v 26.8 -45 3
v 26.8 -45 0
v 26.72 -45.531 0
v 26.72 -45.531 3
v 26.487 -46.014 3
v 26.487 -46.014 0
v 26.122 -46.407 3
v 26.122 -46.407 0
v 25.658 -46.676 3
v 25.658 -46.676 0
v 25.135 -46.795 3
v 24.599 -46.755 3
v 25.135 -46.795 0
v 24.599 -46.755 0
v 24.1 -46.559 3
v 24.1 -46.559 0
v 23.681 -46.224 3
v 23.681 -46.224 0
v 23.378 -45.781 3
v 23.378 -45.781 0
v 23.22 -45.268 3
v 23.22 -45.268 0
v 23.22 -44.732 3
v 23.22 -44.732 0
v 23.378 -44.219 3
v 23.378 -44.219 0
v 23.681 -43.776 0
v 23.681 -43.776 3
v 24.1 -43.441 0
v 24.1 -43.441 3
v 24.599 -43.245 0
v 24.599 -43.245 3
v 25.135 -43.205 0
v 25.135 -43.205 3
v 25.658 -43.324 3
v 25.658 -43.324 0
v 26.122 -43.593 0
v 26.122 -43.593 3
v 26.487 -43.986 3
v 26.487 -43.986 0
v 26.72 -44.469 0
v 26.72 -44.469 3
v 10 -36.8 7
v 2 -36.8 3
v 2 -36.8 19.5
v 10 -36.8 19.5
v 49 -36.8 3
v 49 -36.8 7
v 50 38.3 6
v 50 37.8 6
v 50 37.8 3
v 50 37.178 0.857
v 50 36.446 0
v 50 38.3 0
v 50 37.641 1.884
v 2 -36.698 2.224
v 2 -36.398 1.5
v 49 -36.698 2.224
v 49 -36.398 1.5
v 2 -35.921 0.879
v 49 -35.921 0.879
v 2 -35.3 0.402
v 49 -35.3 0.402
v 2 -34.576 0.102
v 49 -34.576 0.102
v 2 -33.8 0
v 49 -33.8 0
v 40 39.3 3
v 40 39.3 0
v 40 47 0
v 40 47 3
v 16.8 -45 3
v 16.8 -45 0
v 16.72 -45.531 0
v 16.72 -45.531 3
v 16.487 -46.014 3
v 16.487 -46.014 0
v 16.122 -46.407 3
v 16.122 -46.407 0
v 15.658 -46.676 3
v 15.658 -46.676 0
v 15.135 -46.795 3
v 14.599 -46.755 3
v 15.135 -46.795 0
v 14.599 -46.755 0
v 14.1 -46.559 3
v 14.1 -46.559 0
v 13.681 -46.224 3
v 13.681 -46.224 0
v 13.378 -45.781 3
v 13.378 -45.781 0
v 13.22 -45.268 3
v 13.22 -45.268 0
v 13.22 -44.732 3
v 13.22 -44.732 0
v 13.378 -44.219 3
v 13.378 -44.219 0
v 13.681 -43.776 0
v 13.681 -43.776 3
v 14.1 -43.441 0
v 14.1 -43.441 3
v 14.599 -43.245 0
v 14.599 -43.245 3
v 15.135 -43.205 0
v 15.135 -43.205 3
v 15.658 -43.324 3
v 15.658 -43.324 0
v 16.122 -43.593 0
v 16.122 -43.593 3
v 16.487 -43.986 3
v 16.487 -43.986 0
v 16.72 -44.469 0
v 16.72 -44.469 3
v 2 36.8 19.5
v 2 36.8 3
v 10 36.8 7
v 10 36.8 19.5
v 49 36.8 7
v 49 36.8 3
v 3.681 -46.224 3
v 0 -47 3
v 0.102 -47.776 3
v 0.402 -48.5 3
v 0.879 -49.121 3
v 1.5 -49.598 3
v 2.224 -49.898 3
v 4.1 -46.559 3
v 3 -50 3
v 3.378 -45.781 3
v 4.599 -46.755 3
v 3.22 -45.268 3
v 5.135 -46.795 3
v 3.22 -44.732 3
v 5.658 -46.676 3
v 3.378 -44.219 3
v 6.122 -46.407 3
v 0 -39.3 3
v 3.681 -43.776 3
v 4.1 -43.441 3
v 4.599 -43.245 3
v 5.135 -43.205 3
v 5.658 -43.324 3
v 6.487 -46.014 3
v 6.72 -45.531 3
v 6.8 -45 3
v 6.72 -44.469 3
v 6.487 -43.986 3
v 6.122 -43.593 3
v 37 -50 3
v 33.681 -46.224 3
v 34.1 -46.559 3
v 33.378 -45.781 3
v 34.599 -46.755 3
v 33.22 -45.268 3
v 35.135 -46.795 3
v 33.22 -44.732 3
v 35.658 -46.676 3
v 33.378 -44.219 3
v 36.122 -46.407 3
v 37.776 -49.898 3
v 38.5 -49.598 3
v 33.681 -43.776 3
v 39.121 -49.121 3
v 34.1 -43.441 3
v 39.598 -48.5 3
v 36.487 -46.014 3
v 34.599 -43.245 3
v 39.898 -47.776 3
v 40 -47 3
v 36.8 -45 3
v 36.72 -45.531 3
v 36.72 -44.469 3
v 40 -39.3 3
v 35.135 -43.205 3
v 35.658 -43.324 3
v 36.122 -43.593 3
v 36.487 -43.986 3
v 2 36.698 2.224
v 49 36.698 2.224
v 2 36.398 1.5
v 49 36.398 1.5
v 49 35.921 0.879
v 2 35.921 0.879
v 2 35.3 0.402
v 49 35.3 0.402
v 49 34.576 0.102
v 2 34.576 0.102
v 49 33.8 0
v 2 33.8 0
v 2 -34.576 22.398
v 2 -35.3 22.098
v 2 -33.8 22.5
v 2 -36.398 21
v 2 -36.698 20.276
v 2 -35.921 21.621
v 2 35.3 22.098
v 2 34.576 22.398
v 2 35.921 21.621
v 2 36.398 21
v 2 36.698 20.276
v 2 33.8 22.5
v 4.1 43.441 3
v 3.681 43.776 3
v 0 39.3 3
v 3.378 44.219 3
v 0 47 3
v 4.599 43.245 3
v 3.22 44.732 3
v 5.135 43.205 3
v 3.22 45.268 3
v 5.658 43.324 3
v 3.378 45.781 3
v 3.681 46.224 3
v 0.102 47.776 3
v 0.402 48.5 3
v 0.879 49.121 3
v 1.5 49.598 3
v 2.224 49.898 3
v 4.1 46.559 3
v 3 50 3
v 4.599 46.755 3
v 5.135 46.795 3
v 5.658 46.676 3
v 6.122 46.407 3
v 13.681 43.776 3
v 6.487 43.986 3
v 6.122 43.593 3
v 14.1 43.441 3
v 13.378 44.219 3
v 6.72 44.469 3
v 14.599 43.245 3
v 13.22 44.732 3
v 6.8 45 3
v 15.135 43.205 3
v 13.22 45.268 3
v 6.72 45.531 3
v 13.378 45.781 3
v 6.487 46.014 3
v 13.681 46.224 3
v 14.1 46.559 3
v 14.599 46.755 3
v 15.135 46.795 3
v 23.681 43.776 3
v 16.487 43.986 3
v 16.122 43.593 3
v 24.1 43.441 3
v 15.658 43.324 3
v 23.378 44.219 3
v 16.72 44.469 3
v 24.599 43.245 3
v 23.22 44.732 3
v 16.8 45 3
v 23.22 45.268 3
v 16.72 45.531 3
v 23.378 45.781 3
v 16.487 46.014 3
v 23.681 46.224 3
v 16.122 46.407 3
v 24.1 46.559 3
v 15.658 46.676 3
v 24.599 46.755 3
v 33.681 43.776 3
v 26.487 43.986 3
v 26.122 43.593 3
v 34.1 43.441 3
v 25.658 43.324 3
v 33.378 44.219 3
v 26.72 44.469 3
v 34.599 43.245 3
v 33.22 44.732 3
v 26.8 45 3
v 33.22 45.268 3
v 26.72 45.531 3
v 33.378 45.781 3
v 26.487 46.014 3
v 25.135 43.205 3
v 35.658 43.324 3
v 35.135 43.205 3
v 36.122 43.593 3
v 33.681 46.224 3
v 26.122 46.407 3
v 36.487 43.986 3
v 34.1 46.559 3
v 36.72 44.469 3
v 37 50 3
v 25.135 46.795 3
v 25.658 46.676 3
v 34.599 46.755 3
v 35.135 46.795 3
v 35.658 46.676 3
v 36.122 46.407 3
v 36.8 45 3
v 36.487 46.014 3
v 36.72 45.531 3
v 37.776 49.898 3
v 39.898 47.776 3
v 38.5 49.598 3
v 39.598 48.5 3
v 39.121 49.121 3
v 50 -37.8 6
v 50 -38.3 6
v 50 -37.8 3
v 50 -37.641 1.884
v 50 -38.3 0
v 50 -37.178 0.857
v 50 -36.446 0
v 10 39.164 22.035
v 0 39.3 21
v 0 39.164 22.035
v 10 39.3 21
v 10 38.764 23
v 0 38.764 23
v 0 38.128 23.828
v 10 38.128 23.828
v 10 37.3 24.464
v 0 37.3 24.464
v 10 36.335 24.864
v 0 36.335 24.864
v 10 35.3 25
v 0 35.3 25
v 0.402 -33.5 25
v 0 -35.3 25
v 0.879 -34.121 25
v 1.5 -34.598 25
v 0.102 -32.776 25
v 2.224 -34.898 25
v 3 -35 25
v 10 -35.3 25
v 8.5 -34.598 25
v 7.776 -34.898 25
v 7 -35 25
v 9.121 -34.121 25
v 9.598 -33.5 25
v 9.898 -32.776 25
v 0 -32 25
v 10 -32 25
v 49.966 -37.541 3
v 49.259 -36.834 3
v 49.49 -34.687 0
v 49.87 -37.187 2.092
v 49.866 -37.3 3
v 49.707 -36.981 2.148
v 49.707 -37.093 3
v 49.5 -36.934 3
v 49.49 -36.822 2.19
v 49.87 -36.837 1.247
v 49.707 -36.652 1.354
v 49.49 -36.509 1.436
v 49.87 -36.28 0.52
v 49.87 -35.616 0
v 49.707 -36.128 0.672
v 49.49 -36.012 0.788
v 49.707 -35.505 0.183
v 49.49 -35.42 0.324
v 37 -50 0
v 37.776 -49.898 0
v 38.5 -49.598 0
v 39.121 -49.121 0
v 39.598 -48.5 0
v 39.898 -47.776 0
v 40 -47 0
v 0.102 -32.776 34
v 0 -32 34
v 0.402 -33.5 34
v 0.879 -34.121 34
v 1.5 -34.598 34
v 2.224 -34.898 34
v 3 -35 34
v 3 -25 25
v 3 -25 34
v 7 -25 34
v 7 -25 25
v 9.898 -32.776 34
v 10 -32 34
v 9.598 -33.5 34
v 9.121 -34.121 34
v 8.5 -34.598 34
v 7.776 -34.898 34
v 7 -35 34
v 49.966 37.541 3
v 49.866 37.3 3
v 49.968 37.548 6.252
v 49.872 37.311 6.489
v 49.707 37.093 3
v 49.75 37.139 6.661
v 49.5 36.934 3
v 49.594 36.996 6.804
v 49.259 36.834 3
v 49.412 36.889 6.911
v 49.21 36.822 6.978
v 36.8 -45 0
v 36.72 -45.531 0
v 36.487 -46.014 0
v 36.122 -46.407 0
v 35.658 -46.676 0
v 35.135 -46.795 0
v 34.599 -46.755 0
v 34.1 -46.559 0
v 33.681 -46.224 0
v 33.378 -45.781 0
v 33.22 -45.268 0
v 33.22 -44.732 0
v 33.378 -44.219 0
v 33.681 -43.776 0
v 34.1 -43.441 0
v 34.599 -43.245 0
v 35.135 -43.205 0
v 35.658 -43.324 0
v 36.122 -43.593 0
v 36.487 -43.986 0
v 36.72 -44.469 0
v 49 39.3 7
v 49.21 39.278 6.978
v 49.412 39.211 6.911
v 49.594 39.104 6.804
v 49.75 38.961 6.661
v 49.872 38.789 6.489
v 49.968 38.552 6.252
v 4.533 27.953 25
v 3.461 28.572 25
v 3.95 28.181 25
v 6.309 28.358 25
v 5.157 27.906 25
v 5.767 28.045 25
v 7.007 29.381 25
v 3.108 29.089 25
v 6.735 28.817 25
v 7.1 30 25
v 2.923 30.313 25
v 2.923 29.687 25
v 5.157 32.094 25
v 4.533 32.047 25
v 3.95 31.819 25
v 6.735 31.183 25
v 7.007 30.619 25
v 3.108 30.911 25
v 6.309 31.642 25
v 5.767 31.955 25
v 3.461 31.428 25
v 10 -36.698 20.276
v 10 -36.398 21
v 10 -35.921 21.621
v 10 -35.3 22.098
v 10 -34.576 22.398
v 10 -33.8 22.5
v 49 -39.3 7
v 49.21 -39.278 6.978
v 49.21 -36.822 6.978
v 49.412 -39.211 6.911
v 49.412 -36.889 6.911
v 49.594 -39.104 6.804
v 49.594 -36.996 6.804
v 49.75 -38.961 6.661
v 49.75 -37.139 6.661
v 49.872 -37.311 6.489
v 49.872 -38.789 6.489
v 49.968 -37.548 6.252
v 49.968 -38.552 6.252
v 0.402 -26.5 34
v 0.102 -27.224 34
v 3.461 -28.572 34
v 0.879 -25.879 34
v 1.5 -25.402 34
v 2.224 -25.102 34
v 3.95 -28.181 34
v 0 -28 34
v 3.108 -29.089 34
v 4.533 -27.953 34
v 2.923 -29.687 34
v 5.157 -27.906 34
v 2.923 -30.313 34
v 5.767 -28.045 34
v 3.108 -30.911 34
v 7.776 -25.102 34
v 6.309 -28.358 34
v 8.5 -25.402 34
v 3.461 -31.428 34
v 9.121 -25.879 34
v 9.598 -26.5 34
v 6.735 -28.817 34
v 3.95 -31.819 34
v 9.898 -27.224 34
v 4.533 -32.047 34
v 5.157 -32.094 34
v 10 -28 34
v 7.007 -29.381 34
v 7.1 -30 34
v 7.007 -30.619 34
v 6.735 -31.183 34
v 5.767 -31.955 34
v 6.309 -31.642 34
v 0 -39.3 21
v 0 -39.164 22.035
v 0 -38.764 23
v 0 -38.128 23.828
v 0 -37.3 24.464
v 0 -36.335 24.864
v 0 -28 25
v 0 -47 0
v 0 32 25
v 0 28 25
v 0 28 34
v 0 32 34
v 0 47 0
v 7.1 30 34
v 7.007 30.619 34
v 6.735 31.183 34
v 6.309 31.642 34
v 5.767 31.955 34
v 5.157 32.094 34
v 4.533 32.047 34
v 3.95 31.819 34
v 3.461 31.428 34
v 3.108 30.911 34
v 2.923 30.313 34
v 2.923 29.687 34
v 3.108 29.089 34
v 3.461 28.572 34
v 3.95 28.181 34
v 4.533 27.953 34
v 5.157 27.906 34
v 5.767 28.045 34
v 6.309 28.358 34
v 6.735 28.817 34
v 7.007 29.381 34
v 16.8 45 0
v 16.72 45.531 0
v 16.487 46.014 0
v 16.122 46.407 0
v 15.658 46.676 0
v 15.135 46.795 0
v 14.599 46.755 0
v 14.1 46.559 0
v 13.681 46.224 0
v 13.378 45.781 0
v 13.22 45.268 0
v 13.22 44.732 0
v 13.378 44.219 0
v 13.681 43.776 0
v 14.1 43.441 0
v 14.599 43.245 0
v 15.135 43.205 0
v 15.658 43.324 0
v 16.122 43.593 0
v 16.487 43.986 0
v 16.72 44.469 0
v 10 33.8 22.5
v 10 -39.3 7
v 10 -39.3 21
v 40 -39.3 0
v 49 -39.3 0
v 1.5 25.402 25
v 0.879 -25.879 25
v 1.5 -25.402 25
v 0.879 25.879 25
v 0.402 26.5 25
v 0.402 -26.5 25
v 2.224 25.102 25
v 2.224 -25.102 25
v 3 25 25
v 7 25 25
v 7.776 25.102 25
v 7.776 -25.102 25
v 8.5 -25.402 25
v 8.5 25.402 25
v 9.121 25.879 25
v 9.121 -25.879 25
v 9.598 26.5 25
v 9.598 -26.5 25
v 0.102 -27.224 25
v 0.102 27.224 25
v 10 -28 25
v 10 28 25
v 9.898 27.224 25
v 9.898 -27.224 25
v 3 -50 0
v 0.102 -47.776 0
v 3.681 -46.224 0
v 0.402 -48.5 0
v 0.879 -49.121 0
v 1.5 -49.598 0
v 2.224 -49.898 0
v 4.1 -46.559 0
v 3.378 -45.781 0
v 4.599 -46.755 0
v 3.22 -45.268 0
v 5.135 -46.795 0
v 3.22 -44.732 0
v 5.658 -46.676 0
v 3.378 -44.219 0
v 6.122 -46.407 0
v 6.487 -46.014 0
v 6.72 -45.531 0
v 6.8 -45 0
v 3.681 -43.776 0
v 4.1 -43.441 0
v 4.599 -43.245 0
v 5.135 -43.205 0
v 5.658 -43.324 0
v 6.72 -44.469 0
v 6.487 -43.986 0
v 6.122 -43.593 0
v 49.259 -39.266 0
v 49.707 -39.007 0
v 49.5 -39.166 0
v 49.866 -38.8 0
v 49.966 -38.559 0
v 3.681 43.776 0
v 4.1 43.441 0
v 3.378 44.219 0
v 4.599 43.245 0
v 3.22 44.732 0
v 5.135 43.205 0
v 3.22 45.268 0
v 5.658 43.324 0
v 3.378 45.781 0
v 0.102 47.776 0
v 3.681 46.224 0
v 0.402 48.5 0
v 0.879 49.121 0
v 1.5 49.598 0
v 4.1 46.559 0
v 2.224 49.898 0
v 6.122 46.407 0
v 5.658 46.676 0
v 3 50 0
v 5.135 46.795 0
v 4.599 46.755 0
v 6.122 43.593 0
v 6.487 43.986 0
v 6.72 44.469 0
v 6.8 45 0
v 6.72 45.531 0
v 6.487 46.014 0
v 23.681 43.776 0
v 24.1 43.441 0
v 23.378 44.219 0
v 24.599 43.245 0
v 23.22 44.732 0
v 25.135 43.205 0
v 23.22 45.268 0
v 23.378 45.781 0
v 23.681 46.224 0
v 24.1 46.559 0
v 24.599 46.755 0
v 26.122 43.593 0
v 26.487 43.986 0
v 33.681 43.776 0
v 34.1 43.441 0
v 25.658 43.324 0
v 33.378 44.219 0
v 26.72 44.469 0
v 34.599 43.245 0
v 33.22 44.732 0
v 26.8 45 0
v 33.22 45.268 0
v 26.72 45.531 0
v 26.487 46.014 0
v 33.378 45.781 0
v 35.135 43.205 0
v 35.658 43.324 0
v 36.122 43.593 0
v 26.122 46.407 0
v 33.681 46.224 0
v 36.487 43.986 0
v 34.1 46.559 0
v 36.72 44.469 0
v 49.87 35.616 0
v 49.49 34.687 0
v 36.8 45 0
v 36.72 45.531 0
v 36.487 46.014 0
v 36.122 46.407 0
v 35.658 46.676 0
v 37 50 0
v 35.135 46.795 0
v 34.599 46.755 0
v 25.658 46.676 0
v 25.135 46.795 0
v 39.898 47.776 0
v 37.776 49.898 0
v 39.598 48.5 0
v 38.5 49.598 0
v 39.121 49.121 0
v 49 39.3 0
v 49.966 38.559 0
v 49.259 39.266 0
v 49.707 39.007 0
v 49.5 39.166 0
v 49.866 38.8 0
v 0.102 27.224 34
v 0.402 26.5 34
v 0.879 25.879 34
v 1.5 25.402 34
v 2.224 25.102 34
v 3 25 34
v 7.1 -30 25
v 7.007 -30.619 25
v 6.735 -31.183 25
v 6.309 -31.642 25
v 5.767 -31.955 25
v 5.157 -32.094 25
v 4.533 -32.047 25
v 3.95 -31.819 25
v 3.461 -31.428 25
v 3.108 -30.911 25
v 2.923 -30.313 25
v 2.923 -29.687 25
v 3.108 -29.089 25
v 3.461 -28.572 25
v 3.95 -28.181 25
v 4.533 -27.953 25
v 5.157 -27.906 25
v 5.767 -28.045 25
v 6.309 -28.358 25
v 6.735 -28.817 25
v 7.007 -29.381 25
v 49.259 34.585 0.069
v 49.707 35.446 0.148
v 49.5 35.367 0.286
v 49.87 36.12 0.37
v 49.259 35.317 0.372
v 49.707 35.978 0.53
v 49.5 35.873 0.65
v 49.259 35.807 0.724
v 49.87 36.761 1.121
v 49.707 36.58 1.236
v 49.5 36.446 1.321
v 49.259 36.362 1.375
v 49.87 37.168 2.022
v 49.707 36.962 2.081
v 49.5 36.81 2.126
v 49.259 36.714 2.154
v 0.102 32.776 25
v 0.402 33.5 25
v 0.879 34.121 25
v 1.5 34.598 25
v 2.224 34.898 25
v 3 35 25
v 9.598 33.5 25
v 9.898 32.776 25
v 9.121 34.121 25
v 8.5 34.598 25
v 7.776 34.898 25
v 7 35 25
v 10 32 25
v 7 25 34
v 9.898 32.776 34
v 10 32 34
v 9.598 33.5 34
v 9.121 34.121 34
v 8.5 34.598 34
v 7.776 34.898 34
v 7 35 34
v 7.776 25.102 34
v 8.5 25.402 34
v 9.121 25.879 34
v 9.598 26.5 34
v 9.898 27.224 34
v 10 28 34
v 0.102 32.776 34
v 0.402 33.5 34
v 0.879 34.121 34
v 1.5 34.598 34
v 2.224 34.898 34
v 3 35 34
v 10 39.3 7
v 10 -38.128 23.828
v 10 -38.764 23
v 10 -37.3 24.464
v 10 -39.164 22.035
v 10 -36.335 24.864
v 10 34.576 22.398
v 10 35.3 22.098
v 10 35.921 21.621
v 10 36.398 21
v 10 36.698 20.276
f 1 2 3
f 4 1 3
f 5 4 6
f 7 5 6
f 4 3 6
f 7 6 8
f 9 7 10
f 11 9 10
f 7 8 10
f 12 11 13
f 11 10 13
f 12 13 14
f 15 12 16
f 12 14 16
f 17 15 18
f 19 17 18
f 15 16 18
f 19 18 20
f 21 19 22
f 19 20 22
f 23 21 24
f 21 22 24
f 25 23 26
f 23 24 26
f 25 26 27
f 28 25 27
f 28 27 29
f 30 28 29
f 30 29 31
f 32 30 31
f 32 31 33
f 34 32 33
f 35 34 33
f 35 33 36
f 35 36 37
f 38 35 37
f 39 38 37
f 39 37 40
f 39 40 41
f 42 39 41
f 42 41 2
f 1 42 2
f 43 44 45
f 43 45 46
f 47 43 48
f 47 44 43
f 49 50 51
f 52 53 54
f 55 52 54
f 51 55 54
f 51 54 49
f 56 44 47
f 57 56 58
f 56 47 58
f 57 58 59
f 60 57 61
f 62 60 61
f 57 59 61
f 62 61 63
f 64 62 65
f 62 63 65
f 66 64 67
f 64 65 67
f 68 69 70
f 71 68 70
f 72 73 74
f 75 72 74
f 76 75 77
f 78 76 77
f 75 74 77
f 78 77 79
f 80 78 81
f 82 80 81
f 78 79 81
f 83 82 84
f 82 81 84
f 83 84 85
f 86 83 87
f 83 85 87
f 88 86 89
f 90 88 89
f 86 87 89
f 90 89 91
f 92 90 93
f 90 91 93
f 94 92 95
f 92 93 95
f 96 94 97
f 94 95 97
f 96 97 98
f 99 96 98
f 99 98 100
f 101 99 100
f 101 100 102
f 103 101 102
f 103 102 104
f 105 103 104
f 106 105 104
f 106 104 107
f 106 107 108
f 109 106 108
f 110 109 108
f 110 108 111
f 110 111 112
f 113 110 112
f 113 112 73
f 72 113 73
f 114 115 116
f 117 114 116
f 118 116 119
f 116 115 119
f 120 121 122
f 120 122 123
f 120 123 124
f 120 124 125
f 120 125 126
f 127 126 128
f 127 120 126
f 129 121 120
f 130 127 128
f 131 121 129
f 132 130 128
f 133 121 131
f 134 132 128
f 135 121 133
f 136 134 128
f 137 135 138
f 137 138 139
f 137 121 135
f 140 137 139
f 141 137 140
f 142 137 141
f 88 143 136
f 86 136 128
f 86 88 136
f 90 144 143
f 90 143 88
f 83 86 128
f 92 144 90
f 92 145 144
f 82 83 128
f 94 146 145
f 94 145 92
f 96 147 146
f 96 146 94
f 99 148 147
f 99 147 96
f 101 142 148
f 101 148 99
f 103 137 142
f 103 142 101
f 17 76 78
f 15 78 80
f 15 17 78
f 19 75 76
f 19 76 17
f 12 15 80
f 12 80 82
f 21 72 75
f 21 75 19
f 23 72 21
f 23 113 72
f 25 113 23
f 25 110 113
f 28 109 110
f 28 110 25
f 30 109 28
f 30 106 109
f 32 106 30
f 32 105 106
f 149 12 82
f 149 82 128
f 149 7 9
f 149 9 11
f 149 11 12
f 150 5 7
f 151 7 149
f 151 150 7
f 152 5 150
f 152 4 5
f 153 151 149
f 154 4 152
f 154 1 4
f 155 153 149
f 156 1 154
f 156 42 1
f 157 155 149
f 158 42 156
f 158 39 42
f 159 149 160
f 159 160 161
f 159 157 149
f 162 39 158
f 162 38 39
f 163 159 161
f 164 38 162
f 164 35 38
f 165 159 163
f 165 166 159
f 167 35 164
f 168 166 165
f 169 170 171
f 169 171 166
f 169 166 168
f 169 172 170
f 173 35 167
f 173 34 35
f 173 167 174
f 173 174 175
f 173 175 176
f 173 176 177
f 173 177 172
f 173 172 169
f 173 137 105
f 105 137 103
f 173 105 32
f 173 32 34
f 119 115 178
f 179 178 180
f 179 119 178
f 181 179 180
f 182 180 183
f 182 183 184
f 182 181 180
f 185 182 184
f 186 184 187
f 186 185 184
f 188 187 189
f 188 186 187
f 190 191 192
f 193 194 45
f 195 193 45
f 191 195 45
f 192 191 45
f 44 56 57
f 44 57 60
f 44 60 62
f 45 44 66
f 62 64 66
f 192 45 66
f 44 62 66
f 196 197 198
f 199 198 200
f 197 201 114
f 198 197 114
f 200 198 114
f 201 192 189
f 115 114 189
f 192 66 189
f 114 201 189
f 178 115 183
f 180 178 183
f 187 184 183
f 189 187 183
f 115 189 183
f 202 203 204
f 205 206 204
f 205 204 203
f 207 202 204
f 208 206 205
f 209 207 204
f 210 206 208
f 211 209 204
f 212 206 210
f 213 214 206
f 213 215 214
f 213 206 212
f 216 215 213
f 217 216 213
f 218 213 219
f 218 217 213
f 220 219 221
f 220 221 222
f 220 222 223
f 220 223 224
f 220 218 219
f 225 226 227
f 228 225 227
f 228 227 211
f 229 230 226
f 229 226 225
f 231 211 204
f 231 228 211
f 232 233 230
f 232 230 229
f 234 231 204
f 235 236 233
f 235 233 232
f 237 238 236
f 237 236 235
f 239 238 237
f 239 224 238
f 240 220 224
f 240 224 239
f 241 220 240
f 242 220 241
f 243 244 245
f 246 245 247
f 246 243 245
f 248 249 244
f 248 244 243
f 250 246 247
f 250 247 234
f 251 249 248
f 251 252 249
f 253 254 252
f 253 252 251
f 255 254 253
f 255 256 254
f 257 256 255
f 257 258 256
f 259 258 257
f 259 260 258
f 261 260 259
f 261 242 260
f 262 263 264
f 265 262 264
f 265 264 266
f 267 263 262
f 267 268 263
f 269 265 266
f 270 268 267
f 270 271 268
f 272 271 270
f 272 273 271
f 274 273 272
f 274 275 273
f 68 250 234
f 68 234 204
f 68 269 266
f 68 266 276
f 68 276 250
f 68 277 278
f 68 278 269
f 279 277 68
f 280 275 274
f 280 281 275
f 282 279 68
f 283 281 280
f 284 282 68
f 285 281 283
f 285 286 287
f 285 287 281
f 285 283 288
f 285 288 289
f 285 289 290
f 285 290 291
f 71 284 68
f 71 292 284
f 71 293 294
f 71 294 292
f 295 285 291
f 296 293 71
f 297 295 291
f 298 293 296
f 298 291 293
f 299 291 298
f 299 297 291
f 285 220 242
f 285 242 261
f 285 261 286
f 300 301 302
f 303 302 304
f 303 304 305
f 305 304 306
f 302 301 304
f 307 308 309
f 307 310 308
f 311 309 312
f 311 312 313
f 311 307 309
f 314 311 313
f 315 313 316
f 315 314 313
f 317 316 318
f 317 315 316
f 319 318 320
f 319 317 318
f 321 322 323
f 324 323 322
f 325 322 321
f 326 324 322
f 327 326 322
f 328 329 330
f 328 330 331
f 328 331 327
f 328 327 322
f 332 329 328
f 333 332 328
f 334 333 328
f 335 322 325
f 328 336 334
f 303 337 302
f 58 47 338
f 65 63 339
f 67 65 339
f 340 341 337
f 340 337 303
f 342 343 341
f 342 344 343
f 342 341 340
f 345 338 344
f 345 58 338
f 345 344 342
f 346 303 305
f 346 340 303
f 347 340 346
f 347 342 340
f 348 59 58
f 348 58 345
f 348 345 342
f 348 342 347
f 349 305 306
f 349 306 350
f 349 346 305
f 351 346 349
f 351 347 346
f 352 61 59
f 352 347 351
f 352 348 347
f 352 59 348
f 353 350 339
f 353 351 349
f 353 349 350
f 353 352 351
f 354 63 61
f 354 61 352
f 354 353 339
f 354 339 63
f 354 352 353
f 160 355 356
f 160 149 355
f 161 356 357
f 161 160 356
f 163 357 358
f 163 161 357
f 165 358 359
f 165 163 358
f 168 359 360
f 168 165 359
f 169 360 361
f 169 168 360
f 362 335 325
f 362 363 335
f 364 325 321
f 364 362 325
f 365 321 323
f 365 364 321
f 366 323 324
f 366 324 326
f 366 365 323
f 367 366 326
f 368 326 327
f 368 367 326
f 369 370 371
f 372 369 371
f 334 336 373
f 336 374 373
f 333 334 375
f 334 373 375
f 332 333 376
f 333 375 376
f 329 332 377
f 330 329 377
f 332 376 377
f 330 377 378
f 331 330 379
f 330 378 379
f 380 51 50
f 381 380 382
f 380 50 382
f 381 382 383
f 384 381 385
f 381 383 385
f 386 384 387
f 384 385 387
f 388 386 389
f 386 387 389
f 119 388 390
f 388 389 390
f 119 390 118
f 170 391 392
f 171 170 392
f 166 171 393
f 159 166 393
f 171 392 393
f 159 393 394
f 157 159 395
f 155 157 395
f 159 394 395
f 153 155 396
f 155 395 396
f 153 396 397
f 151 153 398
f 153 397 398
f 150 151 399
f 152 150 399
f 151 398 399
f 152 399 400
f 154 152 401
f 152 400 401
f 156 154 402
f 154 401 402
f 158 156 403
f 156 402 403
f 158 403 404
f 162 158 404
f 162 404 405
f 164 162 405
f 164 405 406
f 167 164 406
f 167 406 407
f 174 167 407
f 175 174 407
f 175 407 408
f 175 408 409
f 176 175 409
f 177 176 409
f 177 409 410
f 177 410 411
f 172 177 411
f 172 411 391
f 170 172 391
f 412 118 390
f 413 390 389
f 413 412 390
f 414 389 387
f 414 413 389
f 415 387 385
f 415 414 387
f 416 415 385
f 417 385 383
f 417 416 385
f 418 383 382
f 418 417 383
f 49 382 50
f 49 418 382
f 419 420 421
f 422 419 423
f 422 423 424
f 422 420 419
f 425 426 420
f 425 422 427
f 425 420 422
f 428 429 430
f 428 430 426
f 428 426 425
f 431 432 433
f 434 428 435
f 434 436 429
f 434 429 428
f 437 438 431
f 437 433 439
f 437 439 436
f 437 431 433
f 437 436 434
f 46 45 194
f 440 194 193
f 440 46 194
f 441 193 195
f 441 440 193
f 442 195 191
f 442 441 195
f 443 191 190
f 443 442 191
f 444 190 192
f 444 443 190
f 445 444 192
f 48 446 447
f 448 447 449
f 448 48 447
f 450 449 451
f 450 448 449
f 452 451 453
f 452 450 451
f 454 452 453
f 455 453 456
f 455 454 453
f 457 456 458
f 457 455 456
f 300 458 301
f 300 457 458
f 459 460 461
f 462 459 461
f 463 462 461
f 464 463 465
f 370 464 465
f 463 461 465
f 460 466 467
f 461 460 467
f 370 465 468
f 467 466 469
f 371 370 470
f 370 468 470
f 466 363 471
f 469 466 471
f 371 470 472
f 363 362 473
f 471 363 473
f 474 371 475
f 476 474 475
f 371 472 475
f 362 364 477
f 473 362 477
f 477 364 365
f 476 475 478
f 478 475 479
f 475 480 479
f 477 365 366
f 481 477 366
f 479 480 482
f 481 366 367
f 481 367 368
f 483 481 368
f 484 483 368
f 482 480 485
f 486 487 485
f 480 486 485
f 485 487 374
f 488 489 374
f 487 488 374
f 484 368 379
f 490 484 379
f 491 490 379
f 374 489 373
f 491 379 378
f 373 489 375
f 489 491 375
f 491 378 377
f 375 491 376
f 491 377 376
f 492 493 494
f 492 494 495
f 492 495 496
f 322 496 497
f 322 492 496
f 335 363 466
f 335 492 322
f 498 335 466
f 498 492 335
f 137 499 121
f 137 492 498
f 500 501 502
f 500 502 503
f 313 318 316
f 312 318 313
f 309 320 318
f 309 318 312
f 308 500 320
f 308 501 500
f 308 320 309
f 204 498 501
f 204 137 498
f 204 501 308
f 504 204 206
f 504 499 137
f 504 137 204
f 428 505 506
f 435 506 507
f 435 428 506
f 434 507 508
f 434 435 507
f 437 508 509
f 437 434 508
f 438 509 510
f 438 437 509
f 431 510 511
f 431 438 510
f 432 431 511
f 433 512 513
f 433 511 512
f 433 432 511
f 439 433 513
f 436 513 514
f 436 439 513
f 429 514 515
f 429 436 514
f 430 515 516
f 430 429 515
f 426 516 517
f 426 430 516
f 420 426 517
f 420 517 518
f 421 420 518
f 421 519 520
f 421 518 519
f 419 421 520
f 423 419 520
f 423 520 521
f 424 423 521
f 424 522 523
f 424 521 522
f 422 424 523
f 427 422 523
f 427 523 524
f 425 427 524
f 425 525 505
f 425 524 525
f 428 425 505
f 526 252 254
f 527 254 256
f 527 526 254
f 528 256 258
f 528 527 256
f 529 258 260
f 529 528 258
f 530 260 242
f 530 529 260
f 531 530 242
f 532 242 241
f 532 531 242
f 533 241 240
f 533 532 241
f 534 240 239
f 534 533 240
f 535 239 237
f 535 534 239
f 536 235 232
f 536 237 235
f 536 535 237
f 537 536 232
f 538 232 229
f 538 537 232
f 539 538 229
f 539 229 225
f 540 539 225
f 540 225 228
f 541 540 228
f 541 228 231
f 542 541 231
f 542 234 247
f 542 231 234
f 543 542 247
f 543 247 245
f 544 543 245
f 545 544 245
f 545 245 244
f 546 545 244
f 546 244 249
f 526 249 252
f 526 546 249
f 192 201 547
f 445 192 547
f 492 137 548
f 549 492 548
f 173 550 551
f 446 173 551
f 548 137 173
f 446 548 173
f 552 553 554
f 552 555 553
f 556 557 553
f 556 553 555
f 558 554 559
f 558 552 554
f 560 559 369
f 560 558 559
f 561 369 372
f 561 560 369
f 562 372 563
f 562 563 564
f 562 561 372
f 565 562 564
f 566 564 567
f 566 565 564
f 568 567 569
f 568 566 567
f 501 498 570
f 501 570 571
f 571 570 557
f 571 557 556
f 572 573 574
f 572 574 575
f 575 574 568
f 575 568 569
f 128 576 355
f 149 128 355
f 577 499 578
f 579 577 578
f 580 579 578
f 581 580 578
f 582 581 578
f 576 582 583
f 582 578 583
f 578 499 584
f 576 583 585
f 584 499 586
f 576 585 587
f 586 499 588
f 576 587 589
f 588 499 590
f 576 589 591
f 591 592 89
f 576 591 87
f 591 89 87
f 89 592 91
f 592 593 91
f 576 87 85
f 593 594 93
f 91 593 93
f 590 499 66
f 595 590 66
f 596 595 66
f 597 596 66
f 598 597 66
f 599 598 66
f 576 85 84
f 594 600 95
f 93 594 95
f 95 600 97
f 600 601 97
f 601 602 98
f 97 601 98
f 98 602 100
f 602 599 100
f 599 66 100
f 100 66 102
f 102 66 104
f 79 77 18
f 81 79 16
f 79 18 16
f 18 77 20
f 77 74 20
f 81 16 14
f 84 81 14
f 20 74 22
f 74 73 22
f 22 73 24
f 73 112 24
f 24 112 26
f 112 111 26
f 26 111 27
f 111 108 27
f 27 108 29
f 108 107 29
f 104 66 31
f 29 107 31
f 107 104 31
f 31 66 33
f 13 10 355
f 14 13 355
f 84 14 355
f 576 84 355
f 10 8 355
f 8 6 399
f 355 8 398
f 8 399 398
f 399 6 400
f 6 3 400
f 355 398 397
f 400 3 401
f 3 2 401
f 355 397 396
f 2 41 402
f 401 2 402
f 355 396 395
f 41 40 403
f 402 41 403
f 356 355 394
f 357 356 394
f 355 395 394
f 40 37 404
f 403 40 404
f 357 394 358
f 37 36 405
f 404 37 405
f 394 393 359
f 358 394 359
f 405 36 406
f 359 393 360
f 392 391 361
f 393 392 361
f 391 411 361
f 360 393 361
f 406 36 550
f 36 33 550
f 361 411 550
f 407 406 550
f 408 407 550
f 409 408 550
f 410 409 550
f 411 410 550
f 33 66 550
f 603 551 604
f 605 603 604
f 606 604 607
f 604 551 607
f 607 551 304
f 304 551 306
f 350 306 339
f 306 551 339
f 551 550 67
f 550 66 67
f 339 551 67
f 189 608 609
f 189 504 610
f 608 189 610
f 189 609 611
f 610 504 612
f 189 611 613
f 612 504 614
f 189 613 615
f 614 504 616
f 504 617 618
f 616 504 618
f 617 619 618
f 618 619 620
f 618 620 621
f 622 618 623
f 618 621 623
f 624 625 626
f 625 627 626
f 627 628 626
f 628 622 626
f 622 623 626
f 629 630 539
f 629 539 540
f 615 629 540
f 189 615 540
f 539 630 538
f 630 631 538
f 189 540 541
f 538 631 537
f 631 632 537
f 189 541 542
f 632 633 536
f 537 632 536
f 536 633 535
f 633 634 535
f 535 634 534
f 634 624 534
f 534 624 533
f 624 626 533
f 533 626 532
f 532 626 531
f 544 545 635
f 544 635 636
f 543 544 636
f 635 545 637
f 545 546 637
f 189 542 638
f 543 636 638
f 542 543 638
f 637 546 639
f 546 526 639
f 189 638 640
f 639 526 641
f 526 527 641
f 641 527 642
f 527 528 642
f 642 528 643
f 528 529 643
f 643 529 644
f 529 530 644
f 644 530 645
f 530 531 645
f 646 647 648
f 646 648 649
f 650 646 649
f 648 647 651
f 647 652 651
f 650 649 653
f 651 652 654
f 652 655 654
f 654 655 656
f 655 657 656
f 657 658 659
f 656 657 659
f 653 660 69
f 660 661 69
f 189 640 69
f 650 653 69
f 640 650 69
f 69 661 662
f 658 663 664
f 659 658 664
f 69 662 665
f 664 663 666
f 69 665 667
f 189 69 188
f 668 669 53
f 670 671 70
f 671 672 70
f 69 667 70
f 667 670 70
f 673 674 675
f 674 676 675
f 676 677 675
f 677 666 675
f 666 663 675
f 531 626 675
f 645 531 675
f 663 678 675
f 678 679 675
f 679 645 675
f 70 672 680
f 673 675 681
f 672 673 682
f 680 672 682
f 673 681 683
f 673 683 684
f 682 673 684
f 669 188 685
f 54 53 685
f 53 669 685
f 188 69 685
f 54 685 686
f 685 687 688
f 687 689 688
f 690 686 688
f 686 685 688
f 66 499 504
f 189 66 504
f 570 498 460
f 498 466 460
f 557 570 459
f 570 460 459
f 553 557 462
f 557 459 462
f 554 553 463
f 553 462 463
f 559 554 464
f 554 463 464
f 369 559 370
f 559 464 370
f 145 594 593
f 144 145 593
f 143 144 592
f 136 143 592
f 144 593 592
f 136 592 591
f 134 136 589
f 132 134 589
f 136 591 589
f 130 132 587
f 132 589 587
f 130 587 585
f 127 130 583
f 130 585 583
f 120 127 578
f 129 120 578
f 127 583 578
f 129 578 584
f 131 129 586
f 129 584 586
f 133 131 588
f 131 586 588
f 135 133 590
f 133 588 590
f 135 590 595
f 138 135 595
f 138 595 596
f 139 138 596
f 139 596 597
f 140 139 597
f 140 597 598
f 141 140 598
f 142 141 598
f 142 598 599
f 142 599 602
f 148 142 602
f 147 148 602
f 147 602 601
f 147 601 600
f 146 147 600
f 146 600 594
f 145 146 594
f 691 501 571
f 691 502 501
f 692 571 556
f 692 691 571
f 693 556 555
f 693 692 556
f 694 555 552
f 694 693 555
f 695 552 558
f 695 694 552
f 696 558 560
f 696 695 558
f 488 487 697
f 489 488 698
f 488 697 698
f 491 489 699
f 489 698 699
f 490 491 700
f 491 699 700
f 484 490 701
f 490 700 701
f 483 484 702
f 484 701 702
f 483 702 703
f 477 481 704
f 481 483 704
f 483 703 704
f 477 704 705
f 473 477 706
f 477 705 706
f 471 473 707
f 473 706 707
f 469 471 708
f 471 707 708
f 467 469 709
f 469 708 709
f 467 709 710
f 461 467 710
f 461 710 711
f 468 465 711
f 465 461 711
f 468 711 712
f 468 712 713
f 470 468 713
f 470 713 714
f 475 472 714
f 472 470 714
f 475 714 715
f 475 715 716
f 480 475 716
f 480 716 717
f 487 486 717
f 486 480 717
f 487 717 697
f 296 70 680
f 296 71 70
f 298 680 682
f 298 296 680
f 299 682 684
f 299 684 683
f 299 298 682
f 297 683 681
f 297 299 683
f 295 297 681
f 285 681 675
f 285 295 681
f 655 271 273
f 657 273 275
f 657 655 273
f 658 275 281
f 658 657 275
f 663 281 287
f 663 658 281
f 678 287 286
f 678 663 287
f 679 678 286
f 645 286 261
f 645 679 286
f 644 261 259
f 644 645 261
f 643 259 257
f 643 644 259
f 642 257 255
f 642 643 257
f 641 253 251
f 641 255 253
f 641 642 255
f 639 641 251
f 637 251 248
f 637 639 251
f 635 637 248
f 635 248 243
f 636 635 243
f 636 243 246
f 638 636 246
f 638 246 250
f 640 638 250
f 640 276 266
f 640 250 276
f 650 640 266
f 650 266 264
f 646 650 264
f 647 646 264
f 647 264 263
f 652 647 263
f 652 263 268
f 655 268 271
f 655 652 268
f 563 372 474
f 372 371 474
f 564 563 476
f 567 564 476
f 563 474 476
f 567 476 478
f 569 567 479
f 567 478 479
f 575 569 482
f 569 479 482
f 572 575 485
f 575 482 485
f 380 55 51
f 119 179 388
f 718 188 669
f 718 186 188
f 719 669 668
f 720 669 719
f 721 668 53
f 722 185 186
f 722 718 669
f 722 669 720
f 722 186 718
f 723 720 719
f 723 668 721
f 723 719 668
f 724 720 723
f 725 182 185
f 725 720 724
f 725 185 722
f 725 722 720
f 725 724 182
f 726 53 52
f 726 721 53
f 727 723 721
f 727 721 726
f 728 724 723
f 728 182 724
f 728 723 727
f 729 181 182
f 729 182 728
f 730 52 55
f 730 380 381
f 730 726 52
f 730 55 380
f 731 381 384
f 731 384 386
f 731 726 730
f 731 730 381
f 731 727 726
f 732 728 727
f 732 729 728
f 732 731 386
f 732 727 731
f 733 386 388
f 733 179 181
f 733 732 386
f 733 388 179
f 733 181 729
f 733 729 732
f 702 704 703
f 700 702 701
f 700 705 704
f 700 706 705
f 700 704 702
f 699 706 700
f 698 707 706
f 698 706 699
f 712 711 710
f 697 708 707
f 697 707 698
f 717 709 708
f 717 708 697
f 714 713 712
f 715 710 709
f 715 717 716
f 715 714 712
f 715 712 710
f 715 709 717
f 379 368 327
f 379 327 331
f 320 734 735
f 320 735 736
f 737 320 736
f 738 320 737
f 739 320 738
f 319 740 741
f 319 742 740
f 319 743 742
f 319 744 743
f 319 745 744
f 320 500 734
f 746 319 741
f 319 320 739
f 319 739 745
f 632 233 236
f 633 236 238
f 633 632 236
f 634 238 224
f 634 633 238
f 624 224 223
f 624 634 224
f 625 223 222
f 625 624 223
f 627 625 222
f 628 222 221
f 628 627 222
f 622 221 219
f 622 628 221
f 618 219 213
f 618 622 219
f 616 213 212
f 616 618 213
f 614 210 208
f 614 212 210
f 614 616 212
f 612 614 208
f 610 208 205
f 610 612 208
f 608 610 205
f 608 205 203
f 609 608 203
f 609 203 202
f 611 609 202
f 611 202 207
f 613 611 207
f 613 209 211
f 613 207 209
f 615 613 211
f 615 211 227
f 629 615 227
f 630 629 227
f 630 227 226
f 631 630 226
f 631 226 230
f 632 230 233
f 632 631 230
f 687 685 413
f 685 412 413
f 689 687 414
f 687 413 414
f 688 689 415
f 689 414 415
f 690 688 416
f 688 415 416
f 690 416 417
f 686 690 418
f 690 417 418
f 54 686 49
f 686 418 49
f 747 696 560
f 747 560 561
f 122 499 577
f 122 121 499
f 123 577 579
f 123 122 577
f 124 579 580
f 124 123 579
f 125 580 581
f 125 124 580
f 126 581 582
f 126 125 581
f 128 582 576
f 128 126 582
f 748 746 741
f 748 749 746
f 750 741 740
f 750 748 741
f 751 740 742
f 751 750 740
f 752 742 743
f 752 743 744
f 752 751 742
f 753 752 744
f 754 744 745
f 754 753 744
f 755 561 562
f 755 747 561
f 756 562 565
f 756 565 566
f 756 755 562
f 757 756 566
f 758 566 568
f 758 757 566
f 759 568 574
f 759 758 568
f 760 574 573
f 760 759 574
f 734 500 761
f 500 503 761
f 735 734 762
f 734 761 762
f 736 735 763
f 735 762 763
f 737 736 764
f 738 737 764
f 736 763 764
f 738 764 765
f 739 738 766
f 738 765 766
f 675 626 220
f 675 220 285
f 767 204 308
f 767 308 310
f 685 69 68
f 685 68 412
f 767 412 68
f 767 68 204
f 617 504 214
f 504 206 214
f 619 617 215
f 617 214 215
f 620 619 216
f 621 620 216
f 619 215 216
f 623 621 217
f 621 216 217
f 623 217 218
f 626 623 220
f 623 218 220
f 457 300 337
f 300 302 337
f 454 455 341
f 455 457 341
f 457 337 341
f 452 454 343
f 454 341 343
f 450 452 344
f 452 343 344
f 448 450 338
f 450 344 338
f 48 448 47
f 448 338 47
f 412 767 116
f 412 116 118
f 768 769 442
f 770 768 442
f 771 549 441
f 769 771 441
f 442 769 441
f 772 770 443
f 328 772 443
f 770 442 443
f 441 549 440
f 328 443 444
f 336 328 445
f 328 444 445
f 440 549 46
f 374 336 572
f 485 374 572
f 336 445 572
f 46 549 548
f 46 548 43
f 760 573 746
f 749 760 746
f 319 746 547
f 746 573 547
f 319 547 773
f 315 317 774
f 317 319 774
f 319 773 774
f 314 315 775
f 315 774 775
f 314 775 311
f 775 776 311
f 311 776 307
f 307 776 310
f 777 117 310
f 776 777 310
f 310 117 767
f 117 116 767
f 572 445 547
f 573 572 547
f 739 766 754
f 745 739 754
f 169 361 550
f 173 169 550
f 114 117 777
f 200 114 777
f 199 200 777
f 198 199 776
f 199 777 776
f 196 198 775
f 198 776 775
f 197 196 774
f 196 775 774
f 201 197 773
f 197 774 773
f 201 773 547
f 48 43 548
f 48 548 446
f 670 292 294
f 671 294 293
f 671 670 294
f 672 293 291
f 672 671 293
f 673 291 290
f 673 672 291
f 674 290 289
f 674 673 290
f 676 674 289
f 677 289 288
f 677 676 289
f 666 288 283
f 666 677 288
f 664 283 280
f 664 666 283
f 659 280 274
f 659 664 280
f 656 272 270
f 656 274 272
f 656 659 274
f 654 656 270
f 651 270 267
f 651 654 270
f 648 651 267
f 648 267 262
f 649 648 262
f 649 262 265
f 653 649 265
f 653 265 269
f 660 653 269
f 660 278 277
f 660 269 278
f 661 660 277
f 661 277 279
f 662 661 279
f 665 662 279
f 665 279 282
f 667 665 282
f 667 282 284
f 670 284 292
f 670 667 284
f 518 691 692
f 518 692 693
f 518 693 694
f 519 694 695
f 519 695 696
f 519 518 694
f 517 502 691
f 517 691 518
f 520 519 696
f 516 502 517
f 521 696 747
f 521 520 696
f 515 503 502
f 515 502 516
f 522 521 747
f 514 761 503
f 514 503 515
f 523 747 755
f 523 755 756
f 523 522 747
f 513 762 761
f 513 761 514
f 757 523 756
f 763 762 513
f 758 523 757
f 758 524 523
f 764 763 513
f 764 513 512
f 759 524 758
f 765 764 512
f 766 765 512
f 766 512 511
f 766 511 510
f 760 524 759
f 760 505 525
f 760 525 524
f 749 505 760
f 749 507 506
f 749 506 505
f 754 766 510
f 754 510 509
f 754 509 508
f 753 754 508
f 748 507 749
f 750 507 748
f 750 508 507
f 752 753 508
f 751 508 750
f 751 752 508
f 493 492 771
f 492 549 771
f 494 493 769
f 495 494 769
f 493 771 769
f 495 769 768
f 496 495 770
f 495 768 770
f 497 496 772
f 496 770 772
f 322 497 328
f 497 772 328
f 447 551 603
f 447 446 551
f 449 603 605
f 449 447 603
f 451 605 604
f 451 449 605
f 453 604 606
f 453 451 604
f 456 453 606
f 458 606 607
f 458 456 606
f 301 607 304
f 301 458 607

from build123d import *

# Parameters (mm, degrees)
BOX_W             = 141
BOX_H             = 73.6
BOX_DEPTH         = 22.5
FILLET_R          = 3
CYLINDER001_R     = 2.1
CYLINDER001_DEPTH = 10
BOX003_W          = 10
BOX003_H          = 10
BOX003_DEPTH      = 9
FILLET003_R       = 3
CYLINDER_R        = 1.8
CYLINDER_DEPTH    = 10
ARRAY_X_COUNT     = 4
ARRAY_X_PITCH     = 10
BOX002_W          = 40
BOX002_H          = 100
BOX002_DEPTH      = 3
FILLET001_R       = 3
BOX005_W          = 50
BOX005_H          = 78.6
BOX005_DEPTH      = 7
FILLET005_R       = 1
BOX001_W          = 10
BOX001_H          = 78.6
BOX001_DEPTH      = 25
FILLET002_R       = 4


with BuildPart() as battery_fillet:
    # Box → Box (new body)
    with BuildSketch(Plane(origin=(2, 0, 0), x_dir=(1, 0, 0), z_dir=(0, 0, 1))):
        with Locations((70.5, 36.8)):
            Rectangle(BOX_W, BOX_H)
    extrude(amount=BOX_DEPTH)

    # Fillet
    fillet_edges = [battery_fillet.edges().sort_by_distance(p)[0] for p in [
        (72.5, 0, 0),
        (72.5, 0, 22.5),
        (72.5, 73.6, 0),
        (72.5, 73.6, 22.5),
    ]]
    fillet(fillet_edges, radius=FILLET_R)


with BuildPart() as battery_fillet_1:
    # Fillet placement: moved
    add(battery_fillet.part.moved(Location((0, -36.8, 0))))


with BuildPart() as insert_hole:
    # Cylinder001 → Cylinder001 (new body)
    with BuildSketch(Plane(origin=(5, 0, 0), x_dir=(1, 0, 0), z_dir=(0, 0, 1))):
        Circle(CYLINDER001_R)
    extrude(amount=CYLINDER001_DEPTH)


with BuildPart() as top_insert_box_cut:
    # Box003 → Box003 (new body)
    with BuildSketch(Plane(origin=(0, -5, 0), x_dir=(1, 0, 0), z_dir=(0, 0, 1))):
        with Locations((5, 5)):
            Rectangle(BOX003_W, BOX003_H)
    extrude(amount=BOX003_DEPTH)

    # Fillet003
    fillet003_edges = [top_insert_box_cut.edges().sort_by_distance(p)[0] for p in [
        (0, -5, 4.5),
        (0, 5, 4.5),
        (10, -5, 4.5),
        (10, 5, 4.5),
    ]]
    fillet(fillet003_edges, radius=FILLET003_R)

    # Cut: cut insert hole
    add(insert_hole.part, mode=Mode.SUBTRACT)


with BuildPart() as top_insert_box_cut_1:
    # Cut placement: moved
    add(top_insert_box_cut.part.moved(Location((0, 30, 25))))


with BuildPart() as part_mirroring001:
    # Part__Mirroring001: instance of top insert box cut
    add(top_insert_box_cut_1.part.mirror(Plane(origin=(0, 0, 0), x_dir=(1, 0, 0), z_dir=(0, 1, 0))))


with BuildPart() as bolt_hole:
    # Cylinder → Cylinder (new body)
    with BuildSketch(Plane(origin=(5, 45, 0), x_dir=(1, 0, 0), z_dir=(0, 0, 1))):
        Circle(CYLINDER_R)
    extrude(amount=CYLINDER_DEPTH)


with BuildPart() as bolt_hole_array:
    # Part__Mirroring: instance of bolt hole
    add(bolt_hole.part.mirror(Plane(origin=(0, 0, 0), x_dir=(1, 0, 0), z_dir=(0, 1, 0))))

    # Fusion: union bolt hole
    add(bolt_hole.part)

    # Array X: bolt hole array ×4


with BuildPart() as bolt_hole_array_1:
    add(bolt_hole_array.part)
    with Locations(*[(i * ARRAY_X_PITCH, 0, 0) for i in range(1, ARRAY_X_COUNT)]):
        add(bolt_hole_array.part)


with BuildPart() as back_wall_bottom_cut:
    # Box002 → Box002 (new body)
    with BuildSketch(Plane(origin=(0, -50, 0), x_dir=(1, 0, 0), z_dir=(0, 0, 1))):
        with Locations((20, 50)):
            Rectangle(BOX002_W, BOX002_H)
    extrude(amount=BOX002_DEPTH)

    # Fillet001
    fillet001_edges = [back_wall_bottom_cut.edges().sort_by_distance(p)[0] for p in [
        (0, -50, 1.5),
        (0, 50, 1.5),
        (40, -50, 1.5),
        (40, 50, 1.5),
    ]]
    fillet(fillet001_edges, radius=FILLET001_R)

    # Cut001: cut bolt hole array
    add(bolt_hole_array_1.part, mode=Mode.SUBTRACT)


with BuildPart() as big_bottom_cube_fillet:
    # Box005 → Box005 (new body)
    with BuildSketch(Plane(origin=(0, -39.3, 0), x_dir=(1, 0, 0), z_dir=(0, 0, 1))):
        with Locations((25, 39.3)):
            Rectangle(BOX005_W, BOX005_H)
    extrude(amount=BOX005_DEPTH)

    # Cut004: cut battery fillet
    add(battery_fillet_1.part, mode=Mode.SUBTRACT)

    # Fillet005
    fillet005_edges = [big_bottom_cube_fillet.edges().sort_by_distance(p)[0] for p in [
        (50, -39.3, 3.5),
        (50, 38.05, 7),
        (50, -38.05, 7),
        (50, 39.3, 3.5),
        (50, -36.8, 5),
        (50, -35.92132, 0.87868),
        (50, 35.92132, 0.87868),
        (50, 36.8, 5),
    ]]
    fillet(fillet005_edges, radius=FILLET005_R)


with BuildPart() as battery_back_wall_cut:
    # Box001 → Box001 (new body)
    with BuildSketch(Plane(origin=(0, -39.3, 0), x_dir=(1, 0, 0), z_dir=(0, 0, 1))):
        with Locations((5, 39.3)):
            Rectangle(BOX001_W, BOX001_H)
    extrude(amount=BOX001_DEPTH)

    # Fillet002
    fillet002_edges = [battery_back_wall_cut.edges().sort_by_distance(p)[0] for p in [
        (5, -39.3, 25),
        (5, 39.3, 25),
    ]]
    fillet(fillet002_edges, radius=FILLET002_R)

    # Fusion001: union Part__Mirroring001, top insert box cut, back wall bottom cut, big bottom cube fillet
    add(part_mirroring001.part)
    add(top_insert_box_cut_1.part)
    add(back_wall_bottom_cut.part)
    add(big_bottom_cube_fillet.part)

    # Cut002: cut battery fillet
    add(battery_fillet_1.part, mode=Mode.SUBTRACT)


solid = battery_back_wall_cut.part
